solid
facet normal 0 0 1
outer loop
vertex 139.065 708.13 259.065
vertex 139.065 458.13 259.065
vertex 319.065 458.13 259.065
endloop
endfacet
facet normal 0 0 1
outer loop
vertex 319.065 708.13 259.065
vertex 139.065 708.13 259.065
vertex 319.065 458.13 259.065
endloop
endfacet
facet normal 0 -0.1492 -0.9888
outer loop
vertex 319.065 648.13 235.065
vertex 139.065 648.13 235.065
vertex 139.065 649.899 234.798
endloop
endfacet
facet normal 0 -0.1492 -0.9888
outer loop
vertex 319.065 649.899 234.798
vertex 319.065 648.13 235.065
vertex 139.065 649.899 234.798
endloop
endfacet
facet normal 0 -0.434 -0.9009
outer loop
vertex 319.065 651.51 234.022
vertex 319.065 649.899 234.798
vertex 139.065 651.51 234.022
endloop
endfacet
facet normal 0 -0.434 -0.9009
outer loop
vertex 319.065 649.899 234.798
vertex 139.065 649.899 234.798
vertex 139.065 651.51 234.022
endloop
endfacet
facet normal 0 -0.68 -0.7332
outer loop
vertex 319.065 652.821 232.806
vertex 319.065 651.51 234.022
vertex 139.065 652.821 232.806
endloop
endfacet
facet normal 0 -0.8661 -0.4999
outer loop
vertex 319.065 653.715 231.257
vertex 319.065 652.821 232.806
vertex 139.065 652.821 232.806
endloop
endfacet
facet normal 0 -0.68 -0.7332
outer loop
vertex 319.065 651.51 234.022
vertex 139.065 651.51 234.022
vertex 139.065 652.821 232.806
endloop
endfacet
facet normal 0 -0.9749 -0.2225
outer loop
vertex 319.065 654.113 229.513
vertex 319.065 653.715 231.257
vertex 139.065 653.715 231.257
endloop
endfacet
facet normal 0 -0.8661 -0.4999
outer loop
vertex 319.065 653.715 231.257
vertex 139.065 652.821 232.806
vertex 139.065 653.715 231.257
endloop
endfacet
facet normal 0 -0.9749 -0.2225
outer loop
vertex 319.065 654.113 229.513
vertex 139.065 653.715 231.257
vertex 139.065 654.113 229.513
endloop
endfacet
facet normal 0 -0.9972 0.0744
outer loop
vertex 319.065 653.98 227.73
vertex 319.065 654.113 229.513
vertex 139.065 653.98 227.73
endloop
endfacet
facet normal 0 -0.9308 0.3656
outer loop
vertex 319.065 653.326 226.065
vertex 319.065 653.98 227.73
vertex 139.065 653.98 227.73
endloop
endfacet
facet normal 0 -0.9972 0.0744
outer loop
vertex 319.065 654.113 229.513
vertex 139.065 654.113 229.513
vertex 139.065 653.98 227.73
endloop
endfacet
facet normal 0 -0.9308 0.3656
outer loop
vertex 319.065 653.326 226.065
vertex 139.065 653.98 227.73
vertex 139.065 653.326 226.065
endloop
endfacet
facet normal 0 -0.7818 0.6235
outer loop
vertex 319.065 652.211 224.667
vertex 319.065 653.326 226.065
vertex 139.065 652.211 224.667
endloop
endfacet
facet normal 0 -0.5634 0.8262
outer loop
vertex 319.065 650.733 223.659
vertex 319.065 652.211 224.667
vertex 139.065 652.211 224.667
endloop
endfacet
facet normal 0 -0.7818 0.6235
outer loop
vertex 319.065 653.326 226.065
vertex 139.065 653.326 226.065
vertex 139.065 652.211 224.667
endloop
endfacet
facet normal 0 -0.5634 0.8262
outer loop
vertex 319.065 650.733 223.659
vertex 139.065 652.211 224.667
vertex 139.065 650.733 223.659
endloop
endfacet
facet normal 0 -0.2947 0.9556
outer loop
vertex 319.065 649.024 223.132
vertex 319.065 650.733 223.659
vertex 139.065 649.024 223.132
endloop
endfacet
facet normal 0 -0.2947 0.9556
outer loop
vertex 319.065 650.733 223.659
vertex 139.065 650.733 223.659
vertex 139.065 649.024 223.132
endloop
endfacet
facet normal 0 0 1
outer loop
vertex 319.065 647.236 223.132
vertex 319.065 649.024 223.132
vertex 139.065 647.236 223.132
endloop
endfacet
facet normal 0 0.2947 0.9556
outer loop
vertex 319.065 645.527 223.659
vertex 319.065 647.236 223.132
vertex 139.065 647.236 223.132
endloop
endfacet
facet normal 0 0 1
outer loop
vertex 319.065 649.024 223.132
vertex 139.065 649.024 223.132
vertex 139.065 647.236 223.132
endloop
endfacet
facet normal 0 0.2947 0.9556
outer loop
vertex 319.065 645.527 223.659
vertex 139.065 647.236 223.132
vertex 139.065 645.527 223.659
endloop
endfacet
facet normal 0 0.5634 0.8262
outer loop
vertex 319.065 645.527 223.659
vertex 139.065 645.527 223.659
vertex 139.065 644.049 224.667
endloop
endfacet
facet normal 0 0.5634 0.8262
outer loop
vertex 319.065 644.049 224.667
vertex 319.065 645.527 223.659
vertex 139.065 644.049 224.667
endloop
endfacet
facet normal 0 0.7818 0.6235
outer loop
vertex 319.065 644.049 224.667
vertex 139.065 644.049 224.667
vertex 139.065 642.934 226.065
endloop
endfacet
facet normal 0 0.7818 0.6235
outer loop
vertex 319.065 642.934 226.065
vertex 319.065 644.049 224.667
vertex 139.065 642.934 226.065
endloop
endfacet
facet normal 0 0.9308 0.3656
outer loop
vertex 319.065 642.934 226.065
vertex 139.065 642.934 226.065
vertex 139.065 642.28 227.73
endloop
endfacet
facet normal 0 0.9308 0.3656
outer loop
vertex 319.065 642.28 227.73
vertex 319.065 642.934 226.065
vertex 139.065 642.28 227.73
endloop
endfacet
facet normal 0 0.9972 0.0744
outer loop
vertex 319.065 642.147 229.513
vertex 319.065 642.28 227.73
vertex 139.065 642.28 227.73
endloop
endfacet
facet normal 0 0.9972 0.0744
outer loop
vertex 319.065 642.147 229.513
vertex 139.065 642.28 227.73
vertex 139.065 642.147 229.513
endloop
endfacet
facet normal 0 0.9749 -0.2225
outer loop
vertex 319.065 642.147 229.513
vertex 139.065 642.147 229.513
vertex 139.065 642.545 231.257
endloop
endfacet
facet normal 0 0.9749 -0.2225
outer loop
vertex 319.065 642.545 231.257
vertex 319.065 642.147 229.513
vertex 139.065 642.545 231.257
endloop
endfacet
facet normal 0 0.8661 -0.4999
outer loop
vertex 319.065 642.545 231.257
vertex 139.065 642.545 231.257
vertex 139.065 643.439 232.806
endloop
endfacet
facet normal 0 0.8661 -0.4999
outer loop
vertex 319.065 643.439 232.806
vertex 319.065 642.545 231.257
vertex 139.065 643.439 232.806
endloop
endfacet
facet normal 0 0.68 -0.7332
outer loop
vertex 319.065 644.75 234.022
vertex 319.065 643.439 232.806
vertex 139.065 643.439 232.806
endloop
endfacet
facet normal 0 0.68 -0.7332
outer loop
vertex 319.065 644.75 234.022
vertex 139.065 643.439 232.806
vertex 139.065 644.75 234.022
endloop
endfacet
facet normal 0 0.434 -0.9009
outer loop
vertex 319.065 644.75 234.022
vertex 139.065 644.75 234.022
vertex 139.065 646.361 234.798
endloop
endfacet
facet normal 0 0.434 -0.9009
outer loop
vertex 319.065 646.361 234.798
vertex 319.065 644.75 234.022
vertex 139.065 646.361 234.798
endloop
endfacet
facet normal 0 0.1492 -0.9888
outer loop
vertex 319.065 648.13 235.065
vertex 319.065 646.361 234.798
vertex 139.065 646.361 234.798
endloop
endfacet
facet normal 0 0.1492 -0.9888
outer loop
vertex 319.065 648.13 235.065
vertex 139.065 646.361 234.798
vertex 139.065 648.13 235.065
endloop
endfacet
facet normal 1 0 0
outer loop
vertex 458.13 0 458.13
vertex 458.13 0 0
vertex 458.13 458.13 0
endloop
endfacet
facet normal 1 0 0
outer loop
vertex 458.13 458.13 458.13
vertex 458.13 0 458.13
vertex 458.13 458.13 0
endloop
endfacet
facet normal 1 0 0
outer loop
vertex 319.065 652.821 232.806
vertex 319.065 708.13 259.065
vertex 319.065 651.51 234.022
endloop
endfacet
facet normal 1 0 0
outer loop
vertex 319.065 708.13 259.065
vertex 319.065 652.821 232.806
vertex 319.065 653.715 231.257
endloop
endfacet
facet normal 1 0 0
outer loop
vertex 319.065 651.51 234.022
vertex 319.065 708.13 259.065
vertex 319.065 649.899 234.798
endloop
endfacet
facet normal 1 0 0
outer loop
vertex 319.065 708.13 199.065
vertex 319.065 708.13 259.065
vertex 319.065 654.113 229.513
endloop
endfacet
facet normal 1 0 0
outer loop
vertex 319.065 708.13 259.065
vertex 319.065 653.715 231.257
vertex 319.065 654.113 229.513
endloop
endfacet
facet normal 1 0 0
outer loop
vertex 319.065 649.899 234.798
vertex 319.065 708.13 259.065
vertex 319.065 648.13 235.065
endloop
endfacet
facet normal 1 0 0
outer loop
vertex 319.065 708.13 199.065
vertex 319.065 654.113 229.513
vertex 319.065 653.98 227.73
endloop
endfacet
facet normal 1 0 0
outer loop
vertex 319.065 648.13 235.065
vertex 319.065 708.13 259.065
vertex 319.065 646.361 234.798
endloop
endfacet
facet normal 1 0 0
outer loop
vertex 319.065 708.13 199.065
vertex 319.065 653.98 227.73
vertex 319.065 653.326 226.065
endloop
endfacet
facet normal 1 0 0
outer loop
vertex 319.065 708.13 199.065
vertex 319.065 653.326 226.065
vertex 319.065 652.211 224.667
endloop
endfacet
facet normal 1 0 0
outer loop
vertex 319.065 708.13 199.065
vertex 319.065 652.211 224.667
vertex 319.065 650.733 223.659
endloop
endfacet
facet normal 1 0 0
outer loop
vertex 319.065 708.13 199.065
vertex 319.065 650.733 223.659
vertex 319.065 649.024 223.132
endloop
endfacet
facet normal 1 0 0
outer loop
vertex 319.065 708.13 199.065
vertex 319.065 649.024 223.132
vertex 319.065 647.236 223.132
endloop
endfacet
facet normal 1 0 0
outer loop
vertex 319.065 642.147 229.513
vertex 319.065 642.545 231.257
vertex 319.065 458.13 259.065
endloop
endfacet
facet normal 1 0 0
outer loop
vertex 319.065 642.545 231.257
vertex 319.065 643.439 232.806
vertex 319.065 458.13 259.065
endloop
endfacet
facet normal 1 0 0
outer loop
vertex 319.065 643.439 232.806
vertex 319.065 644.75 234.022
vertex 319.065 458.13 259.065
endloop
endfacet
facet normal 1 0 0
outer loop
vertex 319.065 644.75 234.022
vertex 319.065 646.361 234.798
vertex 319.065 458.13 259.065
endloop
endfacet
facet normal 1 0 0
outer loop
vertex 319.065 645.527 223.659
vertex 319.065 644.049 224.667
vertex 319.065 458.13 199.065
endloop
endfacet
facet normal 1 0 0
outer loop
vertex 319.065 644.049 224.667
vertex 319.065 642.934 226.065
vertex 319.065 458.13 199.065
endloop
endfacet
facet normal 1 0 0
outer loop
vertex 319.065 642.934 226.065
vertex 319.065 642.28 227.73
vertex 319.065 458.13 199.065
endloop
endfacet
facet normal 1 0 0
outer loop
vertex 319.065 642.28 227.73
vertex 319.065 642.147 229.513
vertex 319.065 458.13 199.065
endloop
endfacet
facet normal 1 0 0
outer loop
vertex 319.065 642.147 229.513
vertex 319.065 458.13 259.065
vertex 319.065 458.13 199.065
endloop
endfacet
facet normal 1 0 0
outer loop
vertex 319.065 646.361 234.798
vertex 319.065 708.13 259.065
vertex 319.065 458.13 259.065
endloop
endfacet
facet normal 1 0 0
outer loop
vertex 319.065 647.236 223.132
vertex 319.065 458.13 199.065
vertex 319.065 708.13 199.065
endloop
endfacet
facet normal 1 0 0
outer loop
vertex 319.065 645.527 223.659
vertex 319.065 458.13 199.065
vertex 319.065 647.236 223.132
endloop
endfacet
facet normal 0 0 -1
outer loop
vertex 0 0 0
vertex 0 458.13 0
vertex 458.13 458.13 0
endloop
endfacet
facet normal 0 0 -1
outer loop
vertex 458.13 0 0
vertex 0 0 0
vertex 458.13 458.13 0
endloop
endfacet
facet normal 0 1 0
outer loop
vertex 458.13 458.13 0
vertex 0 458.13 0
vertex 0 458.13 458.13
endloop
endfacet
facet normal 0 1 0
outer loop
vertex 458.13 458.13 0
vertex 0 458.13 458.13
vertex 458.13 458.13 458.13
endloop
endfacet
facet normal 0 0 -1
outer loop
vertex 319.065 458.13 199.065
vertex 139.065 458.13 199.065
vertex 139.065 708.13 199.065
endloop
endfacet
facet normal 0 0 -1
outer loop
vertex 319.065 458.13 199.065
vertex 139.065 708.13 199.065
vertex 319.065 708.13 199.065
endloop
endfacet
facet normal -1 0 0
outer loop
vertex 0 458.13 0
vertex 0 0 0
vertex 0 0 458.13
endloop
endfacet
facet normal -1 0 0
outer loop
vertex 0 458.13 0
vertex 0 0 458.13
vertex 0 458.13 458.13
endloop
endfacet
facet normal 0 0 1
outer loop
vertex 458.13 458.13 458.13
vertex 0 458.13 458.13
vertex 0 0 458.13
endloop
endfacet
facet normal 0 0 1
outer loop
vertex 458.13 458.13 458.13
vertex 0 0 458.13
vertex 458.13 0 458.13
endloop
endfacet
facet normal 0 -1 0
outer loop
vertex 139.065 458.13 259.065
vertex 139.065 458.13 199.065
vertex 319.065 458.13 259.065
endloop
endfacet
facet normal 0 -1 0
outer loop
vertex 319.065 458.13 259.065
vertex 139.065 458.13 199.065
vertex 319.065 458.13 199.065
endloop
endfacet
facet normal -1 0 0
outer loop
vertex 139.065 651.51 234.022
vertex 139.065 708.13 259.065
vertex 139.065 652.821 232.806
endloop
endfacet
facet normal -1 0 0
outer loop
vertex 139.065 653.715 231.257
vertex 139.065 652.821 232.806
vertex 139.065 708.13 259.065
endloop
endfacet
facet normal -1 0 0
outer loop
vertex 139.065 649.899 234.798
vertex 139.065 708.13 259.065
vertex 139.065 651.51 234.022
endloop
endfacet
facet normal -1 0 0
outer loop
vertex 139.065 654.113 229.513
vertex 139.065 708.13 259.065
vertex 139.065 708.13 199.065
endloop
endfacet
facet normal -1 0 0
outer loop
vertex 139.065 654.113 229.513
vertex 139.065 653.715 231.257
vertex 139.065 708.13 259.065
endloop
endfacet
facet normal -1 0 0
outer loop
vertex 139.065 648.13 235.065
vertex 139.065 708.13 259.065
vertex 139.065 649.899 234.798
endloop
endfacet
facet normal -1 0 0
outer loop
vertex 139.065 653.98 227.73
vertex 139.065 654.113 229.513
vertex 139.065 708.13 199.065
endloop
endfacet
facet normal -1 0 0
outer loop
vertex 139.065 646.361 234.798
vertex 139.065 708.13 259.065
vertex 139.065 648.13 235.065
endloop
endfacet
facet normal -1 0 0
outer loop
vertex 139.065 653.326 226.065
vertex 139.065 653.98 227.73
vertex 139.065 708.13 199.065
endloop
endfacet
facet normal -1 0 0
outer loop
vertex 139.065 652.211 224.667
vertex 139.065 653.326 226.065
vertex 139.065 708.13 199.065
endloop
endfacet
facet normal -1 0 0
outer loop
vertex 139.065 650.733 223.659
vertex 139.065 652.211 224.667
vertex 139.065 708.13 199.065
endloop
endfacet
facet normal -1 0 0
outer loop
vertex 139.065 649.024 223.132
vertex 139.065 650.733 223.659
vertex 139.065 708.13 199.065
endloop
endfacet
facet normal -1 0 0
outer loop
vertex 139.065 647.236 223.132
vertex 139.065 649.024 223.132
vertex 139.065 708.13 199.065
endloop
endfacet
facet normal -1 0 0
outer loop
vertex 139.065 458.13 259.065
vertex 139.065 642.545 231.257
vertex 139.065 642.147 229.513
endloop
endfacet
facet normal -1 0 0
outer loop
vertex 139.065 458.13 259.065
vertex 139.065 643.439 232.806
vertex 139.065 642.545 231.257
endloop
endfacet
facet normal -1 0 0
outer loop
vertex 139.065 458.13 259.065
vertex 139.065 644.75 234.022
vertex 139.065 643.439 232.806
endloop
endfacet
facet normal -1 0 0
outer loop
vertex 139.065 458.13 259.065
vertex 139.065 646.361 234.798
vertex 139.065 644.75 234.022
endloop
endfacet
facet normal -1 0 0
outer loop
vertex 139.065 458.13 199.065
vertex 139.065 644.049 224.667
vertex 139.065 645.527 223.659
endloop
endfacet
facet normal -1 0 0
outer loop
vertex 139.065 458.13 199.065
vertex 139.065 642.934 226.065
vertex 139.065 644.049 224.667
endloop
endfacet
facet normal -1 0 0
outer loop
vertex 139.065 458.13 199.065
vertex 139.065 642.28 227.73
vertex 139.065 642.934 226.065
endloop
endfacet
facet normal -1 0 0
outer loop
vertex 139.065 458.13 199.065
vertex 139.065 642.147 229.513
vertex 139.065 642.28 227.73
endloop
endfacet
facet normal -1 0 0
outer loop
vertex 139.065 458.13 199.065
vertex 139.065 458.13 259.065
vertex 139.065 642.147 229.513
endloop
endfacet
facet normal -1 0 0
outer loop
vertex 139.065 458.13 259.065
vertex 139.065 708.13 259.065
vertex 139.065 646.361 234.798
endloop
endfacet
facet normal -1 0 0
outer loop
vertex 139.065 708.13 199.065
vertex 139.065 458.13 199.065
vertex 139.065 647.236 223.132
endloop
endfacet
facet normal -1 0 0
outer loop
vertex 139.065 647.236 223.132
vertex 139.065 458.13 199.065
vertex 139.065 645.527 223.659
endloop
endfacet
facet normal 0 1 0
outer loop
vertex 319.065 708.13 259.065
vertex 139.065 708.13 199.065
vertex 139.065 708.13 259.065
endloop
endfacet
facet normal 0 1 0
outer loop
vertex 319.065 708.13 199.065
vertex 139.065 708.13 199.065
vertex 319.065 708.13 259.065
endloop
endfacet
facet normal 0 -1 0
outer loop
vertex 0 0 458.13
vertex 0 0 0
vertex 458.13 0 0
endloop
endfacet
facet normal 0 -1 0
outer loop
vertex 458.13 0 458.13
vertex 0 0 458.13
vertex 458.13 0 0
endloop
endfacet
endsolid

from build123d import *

# Parameters (mm, degrees)
IZIM1_W                     = 458.13
IZIM1_H                     = 458.13
Y_KSEKLIK_EKSTR_ZYON1_DEPTH = 458.13
IZIM2_W                     = 180
IZIM2_H                     = 60
Y_KSEKLIK_EKSTR_ZYON2_DEPTH = 250
IZIM3_R                     = 6
KES_EKSTR_ZYON1_DEPTH       = 299


with BuildPart() as part:
    # Çizim1 → Yükseklik-Ekstrüzyon1 (new body)
    with BuildSketch(Plane.XY):
        with Locations((229.065, 229.065)):
            Rectangle(IZIM1_W, IZIM1_H)
    extrude(amount=Y_KSEKLIK_EKSTR_ZYON1_DEPTH)


with BuildPart() as body_2:
    # Çizim2 → Yükseklik-Ekstrüzyon2 (new body)
    with BuildSketch(Plane(origin=(0, 458.13, 0), x_dir=(1, 0, 0), z_dir=(0, 1, 0))):
        with Locations((229.065, -229.065)):
            Rectangle(IZIM2_W, IZIM2_H)
    extrude(amount=Y_KSEKLIK_EKSTR_ZYON2_DEPTH)

    # Çizim3 → Kes-Ekstrüzyon1 (cut)
    with BuildSketch(Plane.ZY.offset(-139.065)):
        with Locations((229.065, 648.13)):
            Circle(IZIM3_R)
    extrude(amount=-KES_EKSTR_ZYON1_DEPTH, mode=Mode.SUBTRACT)


solid = Compound([part.part, body_2.part])
